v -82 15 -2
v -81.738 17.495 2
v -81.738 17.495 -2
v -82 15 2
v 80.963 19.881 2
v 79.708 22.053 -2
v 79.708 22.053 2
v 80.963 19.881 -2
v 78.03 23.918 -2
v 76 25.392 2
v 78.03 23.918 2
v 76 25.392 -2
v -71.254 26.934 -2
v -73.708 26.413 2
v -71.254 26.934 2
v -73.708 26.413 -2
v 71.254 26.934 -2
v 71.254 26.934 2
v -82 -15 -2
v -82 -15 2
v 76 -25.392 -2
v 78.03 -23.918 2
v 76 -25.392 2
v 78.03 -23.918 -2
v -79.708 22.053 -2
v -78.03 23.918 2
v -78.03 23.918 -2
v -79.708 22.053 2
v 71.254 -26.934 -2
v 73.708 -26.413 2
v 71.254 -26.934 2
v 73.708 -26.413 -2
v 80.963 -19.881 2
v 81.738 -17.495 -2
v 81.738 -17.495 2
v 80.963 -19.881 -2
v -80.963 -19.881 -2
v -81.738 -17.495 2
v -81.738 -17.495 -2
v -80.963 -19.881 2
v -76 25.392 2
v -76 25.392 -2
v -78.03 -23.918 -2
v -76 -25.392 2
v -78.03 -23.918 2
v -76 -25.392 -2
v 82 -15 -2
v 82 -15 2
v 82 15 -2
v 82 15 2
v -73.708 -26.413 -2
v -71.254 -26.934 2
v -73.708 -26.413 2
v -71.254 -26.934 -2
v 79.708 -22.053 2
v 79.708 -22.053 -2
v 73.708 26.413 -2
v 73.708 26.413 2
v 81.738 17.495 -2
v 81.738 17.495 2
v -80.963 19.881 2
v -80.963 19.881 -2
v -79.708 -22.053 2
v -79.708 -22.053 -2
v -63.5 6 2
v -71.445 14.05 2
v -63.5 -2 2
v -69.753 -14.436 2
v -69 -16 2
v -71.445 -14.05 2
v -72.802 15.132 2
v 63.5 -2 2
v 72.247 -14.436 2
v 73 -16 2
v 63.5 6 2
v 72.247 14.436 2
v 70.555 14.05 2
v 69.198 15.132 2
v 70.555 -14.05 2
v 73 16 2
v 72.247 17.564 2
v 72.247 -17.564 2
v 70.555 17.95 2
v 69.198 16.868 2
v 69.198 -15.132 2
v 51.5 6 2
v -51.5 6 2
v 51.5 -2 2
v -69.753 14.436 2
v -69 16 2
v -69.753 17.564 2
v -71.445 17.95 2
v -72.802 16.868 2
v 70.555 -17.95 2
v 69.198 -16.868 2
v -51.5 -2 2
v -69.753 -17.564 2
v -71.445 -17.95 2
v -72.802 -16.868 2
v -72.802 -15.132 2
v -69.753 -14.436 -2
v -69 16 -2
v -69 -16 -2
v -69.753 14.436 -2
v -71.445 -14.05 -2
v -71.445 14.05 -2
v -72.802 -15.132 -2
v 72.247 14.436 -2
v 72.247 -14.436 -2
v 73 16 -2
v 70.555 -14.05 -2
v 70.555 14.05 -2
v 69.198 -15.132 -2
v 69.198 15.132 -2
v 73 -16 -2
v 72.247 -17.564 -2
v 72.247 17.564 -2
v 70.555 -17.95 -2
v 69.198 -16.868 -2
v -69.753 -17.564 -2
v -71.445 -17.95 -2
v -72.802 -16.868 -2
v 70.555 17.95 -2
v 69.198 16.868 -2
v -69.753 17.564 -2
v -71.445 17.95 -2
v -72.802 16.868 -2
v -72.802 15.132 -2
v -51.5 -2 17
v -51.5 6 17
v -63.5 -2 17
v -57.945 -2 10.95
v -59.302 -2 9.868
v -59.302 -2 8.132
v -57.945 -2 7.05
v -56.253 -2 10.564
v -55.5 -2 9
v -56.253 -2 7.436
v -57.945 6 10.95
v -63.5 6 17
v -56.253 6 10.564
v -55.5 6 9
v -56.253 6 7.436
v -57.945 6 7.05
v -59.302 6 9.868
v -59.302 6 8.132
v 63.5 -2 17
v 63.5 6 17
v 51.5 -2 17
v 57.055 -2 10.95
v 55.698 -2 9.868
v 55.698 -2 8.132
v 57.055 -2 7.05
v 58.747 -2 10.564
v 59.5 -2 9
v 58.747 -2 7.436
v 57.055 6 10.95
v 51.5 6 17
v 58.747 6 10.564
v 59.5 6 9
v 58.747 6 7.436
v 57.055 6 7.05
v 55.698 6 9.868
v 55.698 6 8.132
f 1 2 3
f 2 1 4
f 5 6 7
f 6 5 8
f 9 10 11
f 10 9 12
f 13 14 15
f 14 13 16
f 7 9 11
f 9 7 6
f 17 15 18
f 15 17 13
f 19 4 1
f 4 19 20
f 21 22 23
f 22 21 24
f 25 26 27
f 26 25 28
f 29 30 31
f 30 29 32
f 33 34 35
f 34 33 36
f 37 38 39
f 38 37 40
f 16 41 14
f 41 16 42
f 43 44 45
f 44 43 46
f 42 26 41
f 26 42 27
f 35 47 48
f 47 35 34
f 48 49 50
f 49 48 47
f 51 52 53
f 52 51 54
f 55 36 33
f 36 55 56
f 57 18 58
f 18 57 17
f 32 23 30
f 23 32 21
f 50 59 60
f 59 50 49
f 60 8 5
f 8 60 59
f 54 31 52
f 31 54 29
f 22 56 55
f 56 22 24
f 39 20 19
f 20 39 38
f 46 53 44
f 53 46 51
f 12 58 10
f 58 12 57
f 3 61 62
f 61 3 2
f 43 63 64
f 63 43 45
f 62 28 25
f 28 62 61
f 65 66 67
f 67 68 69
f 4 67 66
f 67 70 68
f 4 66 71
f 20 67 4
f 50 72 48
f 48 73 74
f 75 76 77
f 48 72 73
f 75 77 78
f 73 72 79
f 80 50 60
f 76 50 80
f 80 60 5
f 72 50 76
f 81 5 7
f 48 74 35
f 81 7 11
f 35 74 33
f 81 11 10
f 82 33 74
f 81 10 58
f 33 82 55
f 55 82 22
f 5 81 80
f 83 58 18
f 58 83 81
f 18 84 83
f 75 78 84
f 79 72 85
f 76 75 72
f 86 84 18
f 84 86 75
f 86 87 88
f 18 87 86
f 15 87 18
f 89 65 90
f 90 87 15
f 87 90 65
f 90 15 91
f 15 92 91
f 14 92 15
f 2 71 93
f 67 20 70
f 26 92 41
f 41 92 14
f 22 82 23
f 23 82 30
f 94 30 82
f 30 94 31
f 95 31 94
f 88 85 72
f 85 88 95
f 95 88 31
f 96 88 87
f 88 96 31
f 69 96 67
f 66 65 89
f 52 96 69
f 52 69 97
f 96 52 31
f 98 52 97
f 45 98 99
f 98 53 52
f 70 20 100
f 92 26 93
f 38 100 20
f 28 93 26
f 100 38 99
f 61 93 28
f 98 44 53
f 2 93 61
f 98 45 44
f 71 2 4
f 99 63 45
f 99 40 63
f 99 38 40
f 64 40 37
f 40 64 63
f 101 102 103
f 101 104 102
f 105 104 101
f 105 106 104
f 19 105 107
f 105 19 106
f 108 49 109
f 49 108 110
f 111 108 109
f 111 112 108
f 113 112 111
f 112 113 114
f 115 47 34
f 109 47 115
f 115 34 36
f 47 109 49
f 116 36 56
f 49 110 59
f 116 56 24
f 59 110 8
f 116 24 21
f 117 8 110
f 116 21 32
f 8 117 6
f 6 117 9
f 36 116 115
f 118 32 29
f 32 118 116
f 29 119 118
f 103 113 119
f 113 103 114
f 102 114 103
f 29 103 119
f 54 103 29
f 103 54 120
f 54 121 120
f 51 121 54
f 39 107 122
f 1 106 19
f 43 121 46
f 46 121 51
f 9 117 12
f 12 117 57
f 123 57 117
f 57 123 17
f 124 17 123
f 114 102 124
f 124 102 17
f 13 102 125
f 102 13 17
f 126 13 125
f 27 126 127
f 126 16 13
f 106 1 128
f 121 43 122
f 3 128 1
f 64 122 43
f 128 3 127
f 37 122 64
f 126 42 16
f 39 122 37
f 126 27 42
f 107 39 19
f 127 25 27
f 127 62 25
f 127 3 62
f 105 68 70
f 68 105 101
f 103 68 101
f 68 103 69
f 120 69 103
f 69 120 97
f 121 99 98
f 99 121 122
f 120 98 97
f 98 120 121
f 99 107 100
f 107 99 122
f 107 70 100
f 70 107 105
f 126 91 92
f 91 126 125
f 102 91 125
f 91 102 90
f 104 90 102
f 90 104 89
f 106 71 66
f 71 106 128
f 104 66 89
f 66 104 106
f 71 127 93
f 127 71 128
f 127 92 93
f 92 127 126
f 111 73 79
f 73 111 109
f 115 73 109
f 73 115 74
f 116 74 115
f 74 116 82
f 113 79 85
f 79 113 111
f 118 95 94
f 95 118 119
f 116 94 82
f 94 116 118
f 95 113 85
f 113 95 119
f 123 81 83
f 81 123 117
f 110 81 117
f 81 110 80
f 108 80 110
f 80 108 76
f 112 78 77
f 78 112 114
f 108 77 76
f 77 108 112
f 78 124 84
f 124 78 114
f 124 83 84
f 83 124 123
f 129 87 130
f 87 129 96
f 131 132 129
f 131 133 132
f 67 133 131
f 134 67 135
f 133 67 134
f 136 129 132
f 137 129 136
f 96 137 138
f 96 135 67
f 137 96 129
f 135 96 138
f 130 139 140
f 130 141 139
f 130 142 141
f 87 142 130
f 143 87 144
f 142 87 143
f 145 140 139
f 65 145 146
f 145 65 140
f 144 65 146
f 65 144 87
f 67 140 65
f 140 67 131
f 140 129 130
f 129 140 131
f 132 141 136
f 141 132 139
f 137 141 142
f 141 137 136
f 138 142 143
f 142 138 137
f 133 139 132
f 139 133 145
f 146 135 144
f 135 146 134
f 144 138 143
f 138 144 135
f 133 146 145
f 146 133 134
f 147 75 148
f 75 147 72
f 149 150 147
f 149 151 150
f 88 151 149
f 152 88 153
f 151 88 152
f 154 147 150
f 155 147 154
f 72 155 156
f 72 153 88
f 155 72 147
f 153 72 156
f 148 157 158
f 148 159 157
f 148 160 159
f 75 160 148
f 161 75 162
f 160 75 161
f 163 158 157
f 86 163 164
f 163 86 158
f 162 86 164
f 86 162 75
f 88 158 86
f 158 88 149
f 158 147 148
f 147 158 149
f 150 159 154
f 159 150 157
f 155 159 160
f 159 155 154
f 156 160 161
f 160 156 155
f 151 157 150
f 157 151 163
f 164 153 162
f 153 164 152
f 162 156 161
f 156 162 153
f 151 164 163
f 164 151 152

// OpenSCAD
/*
 * Written by Dermot Tynan, Kalopa Research.
 * GPLv2.
 *
 * This is the definition for the five mast supports on the upper
 * leading-edge of the mast, A8 -> A12.
 *
 * All dimensions are in mm.
 */

module m4_nut_trap()
{
	union() {
		translate([0, 0, -2]) cylinder(r = 4, h = 8, $fn = 6, center = true);
		cylinder(r = 2, h = 20, center = true, $fn = 20);
	}
}

module moconboard()
{
	color("green") {
		difference() {
			cube([127, 1.5, 101.6], center = true);
			translate([57.5, 0, 44]) rotate([90, 0, 0]) cylinder(r = 2, h = 10, center = true);
			translate([57.5, 0, -44]) rotate([90, 0, 0]) cylinder(r = 2, h = 10, center = true);
			translate([-57.5, 0, 44]) rotate([90, 0, 0]) cylinder(r = 2, h = 10, center = true);
			translate([-57.5, 0, -44]) rotate([90, 0, 0]) cylinder(r = 2, h = 10, center = true);
		}
	}
}

module board_support()
{
	difference() {
		cube([12, 16, 8], center = true);
		cylinder(r = 2, h = 20, center = true);

	}
}

module deck_lid()
{
	difference() {
		minkowski() {
			cube([140, 30, 2], center = true);
			cylinder(r = 12, h = 2, center = true);
		}
		translate([-71, -16, 0]) cylinder(r = 2, h = 10, center = true);
		translate([-71, 16, 0]) cylinder(r = 2, h = 10, center = true);
		translate([71, -16, 0]) cylinder(r = 2, h = 10, center = true);
		translate([71, 16, 0]) cylinder(r = 2, h = 10, center = true);
	}
}

module mocon_lid()
{
	union() {
		deck_lid();
		/*#translate([0, 6.5, 53]) moconboard();*/
		translate([-57.5, 2, 9]) rotate([90, 0, 0]) board_support();
		translate([57.5, 2, 9]) rotate([90, 0, 0]) board_support();
	}
}

mocon_lid();
